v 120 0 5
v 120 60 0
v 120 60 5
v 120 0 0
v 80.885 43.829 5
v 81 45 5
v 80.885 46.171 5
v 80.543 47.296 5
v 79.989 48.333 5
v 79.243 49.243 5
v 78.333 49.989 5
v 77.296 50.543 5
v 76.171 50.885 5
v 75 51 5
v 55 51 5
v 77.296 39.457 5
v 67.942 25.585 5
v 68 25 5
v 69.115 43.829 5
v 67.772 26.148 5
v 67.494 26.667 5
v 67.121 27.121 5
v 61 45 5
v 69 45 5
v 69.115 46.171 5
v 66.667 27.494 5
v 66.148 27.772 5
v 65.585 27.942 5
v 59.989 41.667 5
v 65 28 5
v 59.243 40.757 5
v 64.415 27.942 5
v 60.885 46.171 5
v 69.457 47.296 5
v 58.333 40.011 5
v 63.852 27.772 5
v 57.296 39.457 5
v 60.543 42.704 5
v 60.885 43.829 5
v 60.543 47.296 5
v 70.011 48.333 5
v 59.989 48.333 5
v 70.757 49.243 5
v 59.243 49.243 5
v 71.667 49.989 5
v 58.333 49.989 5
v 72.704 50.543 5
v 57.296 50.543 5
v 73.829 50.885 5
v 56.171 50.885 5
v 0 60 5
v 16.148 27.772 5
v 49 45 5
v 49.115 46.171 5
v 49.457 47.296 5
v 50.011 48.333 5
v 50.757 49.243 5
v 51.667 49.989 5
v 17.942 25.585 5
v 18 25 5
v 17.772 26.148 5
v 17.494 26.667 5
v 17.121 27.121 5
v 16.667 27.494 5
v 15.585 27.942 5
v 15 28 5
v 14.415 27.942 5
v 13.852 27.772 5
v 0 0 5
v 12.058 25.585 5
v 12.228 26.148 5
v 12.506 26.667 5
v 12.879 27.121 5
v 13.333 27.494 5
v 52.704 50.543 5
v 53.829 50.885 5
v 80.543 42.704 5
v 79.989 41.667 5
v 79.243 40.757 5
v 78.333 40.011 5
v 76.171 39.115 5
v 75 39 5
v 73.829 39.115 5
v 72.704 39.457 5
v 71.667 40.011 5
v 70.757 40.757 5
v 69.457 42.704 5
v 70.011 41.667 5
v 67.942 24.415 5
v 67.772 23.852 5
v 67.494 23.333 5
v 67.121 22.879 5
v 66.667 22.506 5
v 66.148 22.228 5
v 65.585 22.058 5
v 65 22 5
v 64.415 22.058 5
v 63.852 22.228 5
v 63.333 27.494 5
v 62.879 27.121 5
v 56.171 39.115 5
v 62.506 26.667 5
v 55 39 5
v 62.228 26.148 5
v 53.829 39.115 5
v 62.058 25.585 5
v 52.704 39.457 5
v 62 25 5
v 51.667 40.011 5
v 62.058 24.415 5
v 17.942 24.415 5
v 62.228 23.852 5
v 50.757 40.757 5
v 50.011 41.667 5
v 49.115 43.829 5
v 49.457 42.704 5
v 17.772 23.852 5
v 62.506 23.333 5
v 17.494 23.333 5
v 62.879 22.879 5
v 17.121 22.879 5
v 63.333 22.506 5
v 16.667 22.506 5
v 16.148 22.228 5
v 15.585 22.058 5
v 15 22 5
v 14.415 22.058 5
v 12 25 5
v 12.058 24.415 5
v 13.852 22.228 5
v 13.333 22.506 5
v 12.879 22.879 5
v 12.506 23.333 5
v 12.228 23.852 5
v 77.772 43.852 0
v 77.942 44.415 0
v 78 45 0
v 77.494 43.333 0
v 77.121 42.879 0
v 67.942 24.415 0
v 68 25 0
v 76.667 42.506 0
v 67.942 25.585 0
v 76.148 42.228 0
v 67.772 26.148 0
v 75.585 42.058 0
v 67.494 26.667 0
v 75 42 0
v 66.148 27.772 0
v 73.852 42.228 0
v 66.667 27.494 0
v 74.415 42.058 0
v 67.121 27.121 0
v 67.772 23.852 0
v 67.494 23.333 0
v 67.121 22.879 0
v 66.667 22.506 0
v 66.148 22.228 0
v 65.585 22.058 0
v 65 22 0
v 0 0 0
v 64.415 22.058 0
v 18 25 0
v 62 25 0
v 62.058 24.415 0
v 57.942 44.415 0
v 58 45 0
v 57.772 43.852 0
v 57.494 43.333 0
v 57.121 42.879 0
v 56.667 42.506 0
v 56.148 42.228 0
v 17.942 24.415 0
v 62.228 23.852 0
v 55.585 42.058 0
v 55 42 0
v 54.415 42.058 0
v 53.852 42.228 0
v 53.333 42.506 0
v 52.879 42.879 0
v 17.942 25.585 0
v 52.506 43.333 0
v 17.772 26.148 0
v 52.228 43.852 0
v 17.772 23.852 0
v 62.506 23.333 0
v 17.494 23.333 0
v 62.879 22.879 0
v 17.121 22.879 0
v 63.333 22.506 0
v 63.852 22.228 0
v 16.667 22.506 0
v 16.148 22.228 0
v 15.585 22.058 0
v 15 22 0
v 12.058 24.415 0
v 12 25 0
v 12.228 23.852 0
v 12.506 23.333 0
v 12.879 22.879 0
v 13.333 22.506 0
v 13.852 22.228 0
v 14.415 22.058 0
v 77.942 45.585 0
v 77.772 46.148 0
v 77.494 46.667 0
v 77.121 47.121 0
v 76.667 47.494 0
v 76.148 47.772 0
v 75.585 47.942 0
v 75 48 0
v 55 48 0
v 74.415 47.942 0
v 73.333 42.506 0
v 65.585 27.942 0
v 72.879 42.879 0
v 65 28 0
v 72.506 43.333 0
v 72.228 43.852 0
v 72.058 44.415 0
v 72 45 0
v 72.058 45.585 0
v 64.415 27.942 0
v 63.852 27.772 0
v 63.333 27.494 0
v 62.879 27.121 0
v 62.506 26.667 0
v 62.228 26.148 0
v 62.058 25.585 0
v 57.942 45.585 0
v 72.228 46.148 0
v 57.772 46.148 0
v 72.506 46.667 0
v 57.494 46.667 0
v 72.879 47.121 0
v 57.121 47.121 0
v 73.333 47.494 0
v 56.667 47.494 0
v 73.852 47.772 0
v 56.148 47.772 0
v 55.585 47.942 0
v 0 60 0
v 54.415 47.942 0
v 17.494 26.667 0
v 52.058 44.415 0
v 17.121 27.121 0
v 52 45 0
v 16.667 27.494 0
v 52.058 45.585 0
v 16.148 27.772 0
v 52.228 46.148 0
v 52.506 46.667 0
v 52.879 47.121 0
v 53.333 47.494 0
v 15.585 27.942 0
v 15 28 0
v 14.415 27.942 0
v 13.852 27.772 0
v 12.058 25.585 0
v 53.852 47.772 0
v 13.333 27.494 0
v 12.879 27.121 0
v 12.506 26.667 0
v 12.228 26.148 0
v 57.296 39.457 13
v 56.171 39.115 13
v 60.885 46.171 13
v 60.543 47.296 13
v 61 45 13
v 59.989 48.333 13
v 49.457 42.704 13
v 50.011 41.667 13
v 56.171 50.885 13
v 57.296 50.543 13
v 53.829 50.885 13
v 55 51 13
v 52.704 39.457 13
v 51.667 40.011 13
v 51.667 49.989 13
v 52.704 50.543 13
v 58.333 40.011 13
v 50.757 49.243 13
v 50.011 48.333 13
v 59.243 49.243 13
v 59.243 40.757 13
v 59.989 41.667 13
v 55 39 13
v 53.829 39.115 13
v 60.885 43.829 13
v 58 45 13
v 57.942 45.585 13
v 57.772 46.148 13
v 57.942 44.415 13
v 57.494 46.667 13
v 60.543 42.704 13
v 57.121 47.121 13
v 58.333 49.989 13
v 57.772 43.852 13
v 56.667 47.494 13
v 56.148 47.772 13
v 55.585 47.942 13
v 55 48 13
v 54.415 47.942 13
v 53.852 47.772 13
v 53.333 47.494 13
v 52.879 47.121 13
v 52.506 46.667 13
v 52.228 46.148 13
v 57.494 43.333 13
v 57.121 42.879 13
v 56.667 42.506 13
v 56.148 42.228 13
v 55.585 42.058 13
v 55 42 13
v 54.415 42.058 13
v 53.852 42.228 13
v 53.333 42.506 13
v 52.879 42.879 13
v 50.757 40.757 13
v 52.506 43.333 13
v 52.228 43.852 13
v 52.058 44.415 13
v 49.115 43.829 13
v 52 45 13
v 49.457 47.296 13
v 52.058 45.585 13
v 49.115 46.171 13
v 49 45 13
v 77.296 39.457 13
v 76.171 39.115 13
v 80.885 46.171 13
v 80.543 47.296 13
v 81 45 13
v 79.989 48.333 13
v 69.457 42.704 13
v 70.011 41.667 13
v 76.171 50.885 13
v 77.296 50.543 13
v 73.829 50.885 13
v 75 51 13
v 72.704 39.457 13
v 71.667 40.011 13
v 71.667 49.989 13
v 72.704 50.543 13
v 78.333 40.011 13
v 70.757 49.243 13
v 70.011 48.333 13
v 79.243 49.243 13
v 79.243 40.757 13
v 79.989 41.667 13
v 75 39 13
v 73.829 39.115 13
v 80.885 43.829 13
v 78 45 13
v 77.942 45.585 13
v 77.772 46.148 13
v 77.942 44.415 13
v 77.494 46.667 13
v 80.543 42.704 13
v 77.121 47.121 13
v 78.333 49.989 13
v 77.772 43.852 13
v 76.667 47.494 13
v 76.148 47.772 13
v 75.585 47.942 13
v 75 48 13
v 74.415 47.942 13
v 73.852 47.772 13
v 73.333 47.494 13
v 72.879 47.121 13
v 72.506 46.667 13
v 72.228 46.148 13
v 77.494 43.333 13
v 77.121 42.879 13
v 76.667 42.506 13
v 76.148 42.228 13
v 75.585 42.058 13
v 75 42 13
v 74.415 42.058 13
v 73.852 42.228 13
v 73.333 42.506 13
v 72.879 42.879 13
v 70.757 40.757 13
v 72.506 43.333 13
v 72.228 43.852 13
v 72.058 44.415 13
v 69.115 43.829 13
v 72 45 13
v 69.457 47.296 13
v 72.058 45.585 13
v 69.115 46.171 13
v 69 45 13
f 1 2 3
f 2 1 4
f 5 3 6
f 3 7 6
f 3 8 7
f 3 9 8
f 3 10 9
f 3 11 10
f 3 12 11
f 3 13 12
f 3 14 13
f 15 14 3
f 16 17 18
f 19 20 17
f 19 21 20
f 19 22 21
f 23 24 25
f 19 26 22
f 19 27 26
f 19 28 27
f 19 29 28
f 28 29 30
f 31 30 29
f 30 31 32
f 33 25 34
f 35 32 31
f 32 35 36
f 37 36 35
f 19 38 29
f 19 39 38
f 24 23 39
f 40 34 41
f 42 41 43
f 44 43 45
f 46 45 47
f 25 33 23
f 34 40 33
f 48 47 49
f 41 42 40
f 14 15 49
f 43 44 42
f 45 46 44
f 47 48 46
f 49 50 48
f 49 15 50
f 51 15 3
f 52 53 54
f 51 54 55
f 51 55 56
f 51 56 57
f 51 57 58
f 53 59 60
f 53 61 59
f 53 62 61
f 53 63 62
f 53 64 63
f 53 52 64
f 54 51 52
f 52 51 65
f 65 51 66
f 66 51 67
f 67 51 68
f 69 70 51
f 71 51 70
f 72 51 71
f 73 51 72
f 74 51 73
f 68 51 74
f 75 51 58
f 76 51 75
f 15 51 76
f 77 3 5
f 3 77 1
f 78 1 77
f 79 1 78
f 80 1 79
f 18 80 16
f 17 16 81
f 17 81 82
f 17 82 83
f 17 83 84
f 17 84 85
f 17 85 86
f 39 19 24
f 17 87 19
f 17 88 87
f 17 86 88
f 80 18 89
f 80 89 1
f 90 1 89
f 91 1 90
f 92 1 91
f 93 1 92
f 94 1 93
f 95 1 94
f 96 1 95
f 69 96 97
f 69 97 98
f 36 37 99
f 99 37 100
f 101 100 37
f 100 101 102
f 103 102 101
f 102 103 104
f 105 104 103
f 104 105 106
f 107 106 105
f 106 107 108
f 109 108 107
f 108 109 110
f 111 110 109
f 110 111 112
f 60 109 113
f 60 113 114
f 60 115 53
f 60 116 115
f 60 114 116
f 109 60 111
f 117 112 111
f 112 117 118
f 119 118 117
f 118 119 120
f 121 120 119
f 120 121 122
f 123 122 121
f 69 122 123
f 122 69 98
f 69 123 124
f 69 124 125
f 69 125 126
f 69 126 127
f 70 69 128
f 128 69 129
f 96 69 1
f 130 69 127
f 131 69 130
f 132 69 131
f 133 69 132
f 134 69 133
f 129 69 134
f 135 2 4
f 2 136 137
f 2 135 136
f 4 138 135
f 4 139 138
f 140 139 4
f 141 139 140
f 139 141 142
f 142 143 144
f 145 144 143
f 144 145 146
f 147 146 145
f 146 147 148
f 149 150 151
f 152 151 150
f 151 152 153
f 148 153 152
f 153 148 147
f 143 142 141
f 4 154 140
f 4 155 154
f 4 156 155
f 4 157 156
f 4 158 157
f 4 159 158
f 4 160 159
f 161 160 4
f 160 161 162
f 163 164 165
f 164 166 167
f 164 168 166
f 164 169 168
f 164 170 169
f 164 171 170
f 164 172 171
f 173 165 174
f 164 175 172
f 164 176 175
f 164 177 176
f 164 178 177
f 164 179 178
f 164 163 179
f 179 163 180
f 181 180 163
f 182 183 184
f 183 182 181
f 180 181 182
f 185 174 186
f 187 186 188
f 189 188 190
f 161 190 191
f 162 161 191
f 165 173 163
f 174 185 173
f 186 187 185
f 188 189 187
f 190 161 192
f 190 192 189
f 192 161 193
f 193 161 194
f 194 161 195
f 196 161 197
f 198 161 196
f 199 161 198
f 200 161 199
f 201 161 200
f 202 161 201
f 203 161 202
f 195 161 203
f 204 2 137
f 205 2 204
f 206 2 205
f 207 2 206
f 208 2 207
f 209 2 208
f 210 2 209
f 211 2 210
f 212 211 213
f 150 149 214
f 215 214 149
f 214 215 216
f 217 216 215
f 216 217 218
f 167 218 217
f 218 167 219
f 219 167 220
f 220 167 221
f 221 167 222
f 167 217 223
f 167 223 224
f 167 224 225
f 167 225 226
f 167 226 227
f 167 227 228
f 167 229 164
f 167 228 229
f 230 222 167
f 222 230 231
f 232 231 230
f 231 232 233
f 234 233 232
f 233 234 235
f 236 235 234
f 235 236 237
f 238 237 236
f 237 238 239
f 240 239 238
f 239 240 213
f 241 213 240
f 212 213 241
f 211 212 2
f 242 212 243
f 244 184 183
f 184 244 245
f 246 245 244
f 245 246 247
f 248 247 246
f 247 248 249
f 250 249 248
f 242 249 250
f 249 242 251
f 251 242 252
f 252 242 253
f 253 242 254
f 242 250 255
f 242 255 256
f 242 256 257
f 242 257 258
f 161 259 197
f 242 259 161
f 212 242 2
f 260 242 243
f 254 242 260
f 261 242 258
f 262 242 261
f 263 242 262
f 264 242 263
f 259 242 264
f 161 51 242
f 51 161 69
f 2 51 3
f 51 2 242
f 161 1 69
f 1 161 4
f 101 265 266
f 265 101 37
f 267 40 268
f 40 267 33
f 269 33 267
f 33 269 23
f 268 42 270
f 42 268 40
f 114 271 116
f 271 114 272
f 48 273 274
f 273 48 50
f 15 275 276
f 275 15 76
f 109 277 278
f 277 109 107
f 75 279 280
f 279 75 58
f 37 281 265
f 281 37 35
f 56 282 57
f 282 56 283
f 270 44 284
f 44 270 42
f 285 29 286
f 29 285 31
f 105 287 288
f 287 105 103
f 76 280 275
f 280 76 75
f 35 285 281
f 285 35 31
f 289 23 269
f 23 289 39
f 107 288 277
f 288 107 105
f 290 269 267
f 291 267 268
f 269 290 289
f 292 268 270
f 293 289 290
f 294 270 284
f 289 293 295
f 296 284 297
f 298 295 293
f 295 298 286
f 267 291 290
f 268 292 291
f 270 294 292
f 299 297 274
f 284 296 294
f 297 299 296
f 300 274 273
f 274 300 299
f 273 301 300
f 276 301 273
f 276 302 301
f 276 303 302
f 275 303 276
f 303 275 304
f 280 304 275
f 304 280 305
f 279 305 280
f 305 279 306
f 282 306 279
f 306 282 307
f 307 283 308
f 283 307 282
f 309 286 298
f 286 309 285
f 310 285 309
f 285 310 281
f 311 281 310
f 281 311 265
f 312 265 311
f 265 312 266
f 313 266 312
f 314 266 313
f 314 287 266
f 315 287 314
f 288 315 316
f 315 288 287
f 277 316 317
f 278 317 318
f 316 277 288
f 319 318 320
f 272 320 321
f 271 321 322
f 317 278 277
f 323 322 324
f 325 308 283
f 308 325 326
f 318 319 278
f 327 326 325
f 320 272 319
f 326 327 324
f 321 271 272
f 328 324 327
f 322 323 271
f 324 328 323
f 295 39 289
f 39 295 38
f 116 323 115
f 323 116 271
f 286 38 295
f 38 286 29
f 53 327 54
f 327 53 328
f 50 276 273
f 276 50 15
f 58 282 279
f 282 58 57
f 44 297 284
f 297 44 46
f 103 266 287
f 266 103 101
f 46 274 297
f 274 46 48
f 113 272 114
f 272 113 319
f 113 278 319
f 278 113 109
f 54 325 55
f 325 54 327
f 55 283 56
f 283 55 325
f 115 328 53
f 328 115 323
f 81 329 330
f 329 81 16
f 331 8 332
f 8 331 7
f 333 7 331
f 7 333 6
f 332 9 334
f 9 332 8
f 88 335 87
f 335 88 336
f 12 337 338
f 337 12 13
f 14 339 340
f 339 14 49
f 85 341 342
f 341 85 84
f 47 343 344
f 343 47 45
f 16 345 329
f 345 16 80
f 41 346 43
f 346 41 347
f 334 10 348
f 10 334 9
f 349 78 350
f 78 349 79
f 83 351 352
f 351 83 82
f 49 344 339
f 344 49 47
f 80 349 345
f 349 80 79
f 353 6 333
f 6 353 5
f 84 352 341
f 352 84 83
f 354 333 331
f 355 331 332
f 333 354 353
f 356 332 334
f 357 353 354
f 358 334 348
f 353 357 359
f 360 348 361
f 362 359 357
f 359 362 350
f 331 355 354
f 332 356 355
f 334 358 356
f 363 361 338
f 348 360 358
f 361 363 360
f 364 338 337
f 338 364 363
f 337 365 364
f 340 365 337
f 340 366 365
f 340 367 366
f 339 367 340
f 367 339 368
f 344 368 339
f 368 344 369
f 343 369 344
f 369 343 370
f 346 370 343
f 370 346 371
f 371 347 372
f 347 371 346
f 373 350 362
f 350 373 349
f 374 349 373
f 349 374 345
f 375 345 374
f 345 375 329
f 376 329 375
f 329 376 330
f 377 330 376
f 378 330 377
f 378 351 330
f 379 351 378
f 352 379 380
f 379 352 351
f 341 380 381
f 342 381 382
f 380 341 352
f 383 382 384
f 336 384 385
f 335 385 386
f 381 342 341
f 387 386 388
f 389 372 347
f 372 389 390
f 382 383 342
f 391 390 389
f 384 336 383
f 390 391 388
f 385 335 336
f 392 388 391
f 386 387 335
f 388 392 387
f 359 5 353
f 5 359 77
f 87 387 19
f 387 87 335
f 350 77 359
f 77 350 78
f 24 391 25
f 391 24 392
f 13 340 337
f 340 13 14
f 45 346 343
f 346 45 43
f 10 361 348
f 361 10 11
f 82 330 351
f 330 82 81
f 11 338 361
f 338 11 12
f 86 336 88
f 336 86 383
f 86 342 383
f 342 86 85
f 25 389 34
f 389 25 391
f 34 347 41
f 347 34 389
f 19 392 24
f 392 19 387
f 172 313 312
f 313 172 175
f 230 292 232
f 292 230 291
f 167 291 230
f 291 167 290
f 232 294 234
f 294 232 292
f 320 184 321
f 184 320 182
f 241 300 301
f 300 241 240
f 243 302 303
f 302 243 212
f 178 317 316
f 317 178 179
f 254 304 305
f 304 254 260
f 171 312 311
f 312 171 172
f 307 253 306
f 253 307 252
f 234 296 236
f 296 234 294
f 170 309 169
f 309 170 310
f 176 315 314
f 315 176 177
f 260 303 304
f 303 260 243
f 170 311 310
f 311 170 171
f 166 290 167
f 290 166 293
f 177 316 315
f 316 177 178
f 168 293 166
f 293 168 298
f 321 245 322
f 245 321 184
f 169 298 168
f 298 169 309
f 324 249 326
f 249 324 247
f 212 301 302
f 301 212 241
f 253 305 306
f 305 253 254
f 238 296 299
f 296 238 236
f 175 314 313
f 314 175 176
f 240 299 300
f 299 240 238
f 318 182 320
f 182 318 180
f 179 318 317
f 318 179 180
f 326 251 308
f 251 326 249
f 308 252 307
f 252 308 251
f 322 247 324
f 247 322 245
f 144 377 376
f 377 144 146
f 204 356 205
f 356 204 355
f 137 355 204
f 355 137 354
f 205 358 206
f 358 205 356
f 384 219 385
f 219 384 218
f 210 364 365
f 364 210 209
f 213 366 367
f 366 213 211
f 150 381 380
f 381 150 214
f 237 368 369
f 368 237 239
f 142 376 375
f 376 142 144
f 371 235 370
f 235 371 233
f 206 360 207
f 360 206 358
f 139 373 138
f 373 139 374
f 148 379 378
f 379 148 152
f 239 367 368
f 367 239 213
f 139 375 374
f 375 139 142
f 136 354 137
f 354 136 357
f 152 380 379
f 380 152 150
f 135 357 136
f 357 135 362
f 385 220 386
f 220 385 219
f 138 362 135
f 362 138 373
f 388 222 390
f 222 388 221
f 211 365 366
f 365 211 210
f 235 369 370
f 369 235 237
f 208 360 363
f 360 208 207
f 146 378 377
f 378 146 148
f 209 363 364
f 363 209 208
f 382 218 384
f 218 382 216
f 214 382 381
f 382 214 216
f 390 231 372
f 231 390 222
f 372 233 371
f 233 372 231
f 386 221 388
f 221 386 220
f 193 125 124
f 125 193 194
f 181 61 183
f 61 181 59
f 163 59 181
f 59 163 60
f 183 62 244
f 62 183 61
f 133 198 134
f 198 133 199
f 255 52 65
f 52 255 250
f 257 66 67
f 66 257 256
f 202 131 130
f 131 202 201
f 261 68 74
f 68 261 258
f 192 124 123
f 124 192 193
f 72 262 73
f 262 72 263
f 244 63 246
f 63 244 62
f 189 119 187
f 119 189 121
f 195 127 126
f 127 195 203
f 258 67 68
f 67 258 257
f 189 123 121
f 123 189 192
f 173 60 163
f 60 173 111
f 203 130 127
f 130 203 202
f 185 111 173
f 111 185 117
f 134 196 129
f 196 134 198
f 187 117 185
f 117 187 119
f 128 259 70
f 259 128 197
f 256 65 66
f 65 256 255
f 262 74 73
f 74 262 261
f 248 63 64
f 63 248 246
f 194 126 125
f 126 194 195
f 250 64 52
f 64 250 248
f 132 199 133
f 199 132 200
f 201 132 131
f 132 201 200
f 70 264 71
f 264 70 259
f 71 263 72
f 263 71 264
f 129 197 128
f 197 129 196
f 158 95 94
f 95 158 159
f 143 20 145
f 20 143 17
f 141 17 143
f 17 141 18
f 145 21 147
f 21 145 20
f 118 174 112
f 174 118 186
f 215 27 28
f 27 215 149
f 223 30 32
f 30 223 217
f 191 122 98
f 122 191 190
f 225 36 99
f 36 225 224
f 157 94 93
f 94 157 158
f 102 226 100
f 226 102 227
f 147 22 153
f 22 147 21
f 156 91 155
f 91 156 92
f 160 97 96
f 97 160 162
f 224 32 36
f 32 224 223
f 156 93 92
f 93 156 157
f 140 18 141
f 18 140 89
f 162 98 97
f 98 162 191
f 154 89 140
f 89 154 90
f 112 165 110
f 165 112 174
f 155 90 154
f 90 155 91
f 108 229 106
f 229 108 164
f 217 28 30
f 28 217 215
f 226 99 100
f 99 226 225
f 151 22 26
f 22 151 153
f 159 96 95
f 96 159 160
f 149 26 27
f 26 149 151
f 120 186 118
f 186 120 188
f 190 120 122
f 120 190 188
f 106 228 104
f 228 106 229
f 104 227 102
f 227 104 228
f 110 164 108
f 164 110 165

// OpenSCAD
$fn = 32;

// ----------------------------------------------------------------------
// Mixed field: bosses and holes at given coordinates
// ----------------------------------------------------------------------

// --- parameters (mm) ---
plate_l = 120;            // plate length, X
plate_w = 60;             // plate width, Y
plate_t = 5;              // plate thickness, Z
boss_d = 12;              // boss diameter
boss_h = 8;               // boss height above the plate
hole_d = 6;               // through hole diameter

total_h = plate_t + boss_h;  // overall height

difference() {
  union() {
    cube([plate_l, plate_w, plate_t]);
    translate([55, 45, plate_t]) cylinder(h = boss_h, d = boss_d);
    translate([75, 45, plate_t]) cylinder(h = boss_h, d = boss_d);
  }
  translate([55, 45, -1]) cylinder(h = total_h + 2, d = boss_d / 2);
  translate([75, 45, -1]) cylinder(h = total_h + 2, d = boss_d / 2);
  translate([15, 25, -1]) cylinder(h = plate_t + 2, d = hole_d);
  translate([65, 25, -1]) cylinder(h = plate_t + 2, d = hole_d);
}
